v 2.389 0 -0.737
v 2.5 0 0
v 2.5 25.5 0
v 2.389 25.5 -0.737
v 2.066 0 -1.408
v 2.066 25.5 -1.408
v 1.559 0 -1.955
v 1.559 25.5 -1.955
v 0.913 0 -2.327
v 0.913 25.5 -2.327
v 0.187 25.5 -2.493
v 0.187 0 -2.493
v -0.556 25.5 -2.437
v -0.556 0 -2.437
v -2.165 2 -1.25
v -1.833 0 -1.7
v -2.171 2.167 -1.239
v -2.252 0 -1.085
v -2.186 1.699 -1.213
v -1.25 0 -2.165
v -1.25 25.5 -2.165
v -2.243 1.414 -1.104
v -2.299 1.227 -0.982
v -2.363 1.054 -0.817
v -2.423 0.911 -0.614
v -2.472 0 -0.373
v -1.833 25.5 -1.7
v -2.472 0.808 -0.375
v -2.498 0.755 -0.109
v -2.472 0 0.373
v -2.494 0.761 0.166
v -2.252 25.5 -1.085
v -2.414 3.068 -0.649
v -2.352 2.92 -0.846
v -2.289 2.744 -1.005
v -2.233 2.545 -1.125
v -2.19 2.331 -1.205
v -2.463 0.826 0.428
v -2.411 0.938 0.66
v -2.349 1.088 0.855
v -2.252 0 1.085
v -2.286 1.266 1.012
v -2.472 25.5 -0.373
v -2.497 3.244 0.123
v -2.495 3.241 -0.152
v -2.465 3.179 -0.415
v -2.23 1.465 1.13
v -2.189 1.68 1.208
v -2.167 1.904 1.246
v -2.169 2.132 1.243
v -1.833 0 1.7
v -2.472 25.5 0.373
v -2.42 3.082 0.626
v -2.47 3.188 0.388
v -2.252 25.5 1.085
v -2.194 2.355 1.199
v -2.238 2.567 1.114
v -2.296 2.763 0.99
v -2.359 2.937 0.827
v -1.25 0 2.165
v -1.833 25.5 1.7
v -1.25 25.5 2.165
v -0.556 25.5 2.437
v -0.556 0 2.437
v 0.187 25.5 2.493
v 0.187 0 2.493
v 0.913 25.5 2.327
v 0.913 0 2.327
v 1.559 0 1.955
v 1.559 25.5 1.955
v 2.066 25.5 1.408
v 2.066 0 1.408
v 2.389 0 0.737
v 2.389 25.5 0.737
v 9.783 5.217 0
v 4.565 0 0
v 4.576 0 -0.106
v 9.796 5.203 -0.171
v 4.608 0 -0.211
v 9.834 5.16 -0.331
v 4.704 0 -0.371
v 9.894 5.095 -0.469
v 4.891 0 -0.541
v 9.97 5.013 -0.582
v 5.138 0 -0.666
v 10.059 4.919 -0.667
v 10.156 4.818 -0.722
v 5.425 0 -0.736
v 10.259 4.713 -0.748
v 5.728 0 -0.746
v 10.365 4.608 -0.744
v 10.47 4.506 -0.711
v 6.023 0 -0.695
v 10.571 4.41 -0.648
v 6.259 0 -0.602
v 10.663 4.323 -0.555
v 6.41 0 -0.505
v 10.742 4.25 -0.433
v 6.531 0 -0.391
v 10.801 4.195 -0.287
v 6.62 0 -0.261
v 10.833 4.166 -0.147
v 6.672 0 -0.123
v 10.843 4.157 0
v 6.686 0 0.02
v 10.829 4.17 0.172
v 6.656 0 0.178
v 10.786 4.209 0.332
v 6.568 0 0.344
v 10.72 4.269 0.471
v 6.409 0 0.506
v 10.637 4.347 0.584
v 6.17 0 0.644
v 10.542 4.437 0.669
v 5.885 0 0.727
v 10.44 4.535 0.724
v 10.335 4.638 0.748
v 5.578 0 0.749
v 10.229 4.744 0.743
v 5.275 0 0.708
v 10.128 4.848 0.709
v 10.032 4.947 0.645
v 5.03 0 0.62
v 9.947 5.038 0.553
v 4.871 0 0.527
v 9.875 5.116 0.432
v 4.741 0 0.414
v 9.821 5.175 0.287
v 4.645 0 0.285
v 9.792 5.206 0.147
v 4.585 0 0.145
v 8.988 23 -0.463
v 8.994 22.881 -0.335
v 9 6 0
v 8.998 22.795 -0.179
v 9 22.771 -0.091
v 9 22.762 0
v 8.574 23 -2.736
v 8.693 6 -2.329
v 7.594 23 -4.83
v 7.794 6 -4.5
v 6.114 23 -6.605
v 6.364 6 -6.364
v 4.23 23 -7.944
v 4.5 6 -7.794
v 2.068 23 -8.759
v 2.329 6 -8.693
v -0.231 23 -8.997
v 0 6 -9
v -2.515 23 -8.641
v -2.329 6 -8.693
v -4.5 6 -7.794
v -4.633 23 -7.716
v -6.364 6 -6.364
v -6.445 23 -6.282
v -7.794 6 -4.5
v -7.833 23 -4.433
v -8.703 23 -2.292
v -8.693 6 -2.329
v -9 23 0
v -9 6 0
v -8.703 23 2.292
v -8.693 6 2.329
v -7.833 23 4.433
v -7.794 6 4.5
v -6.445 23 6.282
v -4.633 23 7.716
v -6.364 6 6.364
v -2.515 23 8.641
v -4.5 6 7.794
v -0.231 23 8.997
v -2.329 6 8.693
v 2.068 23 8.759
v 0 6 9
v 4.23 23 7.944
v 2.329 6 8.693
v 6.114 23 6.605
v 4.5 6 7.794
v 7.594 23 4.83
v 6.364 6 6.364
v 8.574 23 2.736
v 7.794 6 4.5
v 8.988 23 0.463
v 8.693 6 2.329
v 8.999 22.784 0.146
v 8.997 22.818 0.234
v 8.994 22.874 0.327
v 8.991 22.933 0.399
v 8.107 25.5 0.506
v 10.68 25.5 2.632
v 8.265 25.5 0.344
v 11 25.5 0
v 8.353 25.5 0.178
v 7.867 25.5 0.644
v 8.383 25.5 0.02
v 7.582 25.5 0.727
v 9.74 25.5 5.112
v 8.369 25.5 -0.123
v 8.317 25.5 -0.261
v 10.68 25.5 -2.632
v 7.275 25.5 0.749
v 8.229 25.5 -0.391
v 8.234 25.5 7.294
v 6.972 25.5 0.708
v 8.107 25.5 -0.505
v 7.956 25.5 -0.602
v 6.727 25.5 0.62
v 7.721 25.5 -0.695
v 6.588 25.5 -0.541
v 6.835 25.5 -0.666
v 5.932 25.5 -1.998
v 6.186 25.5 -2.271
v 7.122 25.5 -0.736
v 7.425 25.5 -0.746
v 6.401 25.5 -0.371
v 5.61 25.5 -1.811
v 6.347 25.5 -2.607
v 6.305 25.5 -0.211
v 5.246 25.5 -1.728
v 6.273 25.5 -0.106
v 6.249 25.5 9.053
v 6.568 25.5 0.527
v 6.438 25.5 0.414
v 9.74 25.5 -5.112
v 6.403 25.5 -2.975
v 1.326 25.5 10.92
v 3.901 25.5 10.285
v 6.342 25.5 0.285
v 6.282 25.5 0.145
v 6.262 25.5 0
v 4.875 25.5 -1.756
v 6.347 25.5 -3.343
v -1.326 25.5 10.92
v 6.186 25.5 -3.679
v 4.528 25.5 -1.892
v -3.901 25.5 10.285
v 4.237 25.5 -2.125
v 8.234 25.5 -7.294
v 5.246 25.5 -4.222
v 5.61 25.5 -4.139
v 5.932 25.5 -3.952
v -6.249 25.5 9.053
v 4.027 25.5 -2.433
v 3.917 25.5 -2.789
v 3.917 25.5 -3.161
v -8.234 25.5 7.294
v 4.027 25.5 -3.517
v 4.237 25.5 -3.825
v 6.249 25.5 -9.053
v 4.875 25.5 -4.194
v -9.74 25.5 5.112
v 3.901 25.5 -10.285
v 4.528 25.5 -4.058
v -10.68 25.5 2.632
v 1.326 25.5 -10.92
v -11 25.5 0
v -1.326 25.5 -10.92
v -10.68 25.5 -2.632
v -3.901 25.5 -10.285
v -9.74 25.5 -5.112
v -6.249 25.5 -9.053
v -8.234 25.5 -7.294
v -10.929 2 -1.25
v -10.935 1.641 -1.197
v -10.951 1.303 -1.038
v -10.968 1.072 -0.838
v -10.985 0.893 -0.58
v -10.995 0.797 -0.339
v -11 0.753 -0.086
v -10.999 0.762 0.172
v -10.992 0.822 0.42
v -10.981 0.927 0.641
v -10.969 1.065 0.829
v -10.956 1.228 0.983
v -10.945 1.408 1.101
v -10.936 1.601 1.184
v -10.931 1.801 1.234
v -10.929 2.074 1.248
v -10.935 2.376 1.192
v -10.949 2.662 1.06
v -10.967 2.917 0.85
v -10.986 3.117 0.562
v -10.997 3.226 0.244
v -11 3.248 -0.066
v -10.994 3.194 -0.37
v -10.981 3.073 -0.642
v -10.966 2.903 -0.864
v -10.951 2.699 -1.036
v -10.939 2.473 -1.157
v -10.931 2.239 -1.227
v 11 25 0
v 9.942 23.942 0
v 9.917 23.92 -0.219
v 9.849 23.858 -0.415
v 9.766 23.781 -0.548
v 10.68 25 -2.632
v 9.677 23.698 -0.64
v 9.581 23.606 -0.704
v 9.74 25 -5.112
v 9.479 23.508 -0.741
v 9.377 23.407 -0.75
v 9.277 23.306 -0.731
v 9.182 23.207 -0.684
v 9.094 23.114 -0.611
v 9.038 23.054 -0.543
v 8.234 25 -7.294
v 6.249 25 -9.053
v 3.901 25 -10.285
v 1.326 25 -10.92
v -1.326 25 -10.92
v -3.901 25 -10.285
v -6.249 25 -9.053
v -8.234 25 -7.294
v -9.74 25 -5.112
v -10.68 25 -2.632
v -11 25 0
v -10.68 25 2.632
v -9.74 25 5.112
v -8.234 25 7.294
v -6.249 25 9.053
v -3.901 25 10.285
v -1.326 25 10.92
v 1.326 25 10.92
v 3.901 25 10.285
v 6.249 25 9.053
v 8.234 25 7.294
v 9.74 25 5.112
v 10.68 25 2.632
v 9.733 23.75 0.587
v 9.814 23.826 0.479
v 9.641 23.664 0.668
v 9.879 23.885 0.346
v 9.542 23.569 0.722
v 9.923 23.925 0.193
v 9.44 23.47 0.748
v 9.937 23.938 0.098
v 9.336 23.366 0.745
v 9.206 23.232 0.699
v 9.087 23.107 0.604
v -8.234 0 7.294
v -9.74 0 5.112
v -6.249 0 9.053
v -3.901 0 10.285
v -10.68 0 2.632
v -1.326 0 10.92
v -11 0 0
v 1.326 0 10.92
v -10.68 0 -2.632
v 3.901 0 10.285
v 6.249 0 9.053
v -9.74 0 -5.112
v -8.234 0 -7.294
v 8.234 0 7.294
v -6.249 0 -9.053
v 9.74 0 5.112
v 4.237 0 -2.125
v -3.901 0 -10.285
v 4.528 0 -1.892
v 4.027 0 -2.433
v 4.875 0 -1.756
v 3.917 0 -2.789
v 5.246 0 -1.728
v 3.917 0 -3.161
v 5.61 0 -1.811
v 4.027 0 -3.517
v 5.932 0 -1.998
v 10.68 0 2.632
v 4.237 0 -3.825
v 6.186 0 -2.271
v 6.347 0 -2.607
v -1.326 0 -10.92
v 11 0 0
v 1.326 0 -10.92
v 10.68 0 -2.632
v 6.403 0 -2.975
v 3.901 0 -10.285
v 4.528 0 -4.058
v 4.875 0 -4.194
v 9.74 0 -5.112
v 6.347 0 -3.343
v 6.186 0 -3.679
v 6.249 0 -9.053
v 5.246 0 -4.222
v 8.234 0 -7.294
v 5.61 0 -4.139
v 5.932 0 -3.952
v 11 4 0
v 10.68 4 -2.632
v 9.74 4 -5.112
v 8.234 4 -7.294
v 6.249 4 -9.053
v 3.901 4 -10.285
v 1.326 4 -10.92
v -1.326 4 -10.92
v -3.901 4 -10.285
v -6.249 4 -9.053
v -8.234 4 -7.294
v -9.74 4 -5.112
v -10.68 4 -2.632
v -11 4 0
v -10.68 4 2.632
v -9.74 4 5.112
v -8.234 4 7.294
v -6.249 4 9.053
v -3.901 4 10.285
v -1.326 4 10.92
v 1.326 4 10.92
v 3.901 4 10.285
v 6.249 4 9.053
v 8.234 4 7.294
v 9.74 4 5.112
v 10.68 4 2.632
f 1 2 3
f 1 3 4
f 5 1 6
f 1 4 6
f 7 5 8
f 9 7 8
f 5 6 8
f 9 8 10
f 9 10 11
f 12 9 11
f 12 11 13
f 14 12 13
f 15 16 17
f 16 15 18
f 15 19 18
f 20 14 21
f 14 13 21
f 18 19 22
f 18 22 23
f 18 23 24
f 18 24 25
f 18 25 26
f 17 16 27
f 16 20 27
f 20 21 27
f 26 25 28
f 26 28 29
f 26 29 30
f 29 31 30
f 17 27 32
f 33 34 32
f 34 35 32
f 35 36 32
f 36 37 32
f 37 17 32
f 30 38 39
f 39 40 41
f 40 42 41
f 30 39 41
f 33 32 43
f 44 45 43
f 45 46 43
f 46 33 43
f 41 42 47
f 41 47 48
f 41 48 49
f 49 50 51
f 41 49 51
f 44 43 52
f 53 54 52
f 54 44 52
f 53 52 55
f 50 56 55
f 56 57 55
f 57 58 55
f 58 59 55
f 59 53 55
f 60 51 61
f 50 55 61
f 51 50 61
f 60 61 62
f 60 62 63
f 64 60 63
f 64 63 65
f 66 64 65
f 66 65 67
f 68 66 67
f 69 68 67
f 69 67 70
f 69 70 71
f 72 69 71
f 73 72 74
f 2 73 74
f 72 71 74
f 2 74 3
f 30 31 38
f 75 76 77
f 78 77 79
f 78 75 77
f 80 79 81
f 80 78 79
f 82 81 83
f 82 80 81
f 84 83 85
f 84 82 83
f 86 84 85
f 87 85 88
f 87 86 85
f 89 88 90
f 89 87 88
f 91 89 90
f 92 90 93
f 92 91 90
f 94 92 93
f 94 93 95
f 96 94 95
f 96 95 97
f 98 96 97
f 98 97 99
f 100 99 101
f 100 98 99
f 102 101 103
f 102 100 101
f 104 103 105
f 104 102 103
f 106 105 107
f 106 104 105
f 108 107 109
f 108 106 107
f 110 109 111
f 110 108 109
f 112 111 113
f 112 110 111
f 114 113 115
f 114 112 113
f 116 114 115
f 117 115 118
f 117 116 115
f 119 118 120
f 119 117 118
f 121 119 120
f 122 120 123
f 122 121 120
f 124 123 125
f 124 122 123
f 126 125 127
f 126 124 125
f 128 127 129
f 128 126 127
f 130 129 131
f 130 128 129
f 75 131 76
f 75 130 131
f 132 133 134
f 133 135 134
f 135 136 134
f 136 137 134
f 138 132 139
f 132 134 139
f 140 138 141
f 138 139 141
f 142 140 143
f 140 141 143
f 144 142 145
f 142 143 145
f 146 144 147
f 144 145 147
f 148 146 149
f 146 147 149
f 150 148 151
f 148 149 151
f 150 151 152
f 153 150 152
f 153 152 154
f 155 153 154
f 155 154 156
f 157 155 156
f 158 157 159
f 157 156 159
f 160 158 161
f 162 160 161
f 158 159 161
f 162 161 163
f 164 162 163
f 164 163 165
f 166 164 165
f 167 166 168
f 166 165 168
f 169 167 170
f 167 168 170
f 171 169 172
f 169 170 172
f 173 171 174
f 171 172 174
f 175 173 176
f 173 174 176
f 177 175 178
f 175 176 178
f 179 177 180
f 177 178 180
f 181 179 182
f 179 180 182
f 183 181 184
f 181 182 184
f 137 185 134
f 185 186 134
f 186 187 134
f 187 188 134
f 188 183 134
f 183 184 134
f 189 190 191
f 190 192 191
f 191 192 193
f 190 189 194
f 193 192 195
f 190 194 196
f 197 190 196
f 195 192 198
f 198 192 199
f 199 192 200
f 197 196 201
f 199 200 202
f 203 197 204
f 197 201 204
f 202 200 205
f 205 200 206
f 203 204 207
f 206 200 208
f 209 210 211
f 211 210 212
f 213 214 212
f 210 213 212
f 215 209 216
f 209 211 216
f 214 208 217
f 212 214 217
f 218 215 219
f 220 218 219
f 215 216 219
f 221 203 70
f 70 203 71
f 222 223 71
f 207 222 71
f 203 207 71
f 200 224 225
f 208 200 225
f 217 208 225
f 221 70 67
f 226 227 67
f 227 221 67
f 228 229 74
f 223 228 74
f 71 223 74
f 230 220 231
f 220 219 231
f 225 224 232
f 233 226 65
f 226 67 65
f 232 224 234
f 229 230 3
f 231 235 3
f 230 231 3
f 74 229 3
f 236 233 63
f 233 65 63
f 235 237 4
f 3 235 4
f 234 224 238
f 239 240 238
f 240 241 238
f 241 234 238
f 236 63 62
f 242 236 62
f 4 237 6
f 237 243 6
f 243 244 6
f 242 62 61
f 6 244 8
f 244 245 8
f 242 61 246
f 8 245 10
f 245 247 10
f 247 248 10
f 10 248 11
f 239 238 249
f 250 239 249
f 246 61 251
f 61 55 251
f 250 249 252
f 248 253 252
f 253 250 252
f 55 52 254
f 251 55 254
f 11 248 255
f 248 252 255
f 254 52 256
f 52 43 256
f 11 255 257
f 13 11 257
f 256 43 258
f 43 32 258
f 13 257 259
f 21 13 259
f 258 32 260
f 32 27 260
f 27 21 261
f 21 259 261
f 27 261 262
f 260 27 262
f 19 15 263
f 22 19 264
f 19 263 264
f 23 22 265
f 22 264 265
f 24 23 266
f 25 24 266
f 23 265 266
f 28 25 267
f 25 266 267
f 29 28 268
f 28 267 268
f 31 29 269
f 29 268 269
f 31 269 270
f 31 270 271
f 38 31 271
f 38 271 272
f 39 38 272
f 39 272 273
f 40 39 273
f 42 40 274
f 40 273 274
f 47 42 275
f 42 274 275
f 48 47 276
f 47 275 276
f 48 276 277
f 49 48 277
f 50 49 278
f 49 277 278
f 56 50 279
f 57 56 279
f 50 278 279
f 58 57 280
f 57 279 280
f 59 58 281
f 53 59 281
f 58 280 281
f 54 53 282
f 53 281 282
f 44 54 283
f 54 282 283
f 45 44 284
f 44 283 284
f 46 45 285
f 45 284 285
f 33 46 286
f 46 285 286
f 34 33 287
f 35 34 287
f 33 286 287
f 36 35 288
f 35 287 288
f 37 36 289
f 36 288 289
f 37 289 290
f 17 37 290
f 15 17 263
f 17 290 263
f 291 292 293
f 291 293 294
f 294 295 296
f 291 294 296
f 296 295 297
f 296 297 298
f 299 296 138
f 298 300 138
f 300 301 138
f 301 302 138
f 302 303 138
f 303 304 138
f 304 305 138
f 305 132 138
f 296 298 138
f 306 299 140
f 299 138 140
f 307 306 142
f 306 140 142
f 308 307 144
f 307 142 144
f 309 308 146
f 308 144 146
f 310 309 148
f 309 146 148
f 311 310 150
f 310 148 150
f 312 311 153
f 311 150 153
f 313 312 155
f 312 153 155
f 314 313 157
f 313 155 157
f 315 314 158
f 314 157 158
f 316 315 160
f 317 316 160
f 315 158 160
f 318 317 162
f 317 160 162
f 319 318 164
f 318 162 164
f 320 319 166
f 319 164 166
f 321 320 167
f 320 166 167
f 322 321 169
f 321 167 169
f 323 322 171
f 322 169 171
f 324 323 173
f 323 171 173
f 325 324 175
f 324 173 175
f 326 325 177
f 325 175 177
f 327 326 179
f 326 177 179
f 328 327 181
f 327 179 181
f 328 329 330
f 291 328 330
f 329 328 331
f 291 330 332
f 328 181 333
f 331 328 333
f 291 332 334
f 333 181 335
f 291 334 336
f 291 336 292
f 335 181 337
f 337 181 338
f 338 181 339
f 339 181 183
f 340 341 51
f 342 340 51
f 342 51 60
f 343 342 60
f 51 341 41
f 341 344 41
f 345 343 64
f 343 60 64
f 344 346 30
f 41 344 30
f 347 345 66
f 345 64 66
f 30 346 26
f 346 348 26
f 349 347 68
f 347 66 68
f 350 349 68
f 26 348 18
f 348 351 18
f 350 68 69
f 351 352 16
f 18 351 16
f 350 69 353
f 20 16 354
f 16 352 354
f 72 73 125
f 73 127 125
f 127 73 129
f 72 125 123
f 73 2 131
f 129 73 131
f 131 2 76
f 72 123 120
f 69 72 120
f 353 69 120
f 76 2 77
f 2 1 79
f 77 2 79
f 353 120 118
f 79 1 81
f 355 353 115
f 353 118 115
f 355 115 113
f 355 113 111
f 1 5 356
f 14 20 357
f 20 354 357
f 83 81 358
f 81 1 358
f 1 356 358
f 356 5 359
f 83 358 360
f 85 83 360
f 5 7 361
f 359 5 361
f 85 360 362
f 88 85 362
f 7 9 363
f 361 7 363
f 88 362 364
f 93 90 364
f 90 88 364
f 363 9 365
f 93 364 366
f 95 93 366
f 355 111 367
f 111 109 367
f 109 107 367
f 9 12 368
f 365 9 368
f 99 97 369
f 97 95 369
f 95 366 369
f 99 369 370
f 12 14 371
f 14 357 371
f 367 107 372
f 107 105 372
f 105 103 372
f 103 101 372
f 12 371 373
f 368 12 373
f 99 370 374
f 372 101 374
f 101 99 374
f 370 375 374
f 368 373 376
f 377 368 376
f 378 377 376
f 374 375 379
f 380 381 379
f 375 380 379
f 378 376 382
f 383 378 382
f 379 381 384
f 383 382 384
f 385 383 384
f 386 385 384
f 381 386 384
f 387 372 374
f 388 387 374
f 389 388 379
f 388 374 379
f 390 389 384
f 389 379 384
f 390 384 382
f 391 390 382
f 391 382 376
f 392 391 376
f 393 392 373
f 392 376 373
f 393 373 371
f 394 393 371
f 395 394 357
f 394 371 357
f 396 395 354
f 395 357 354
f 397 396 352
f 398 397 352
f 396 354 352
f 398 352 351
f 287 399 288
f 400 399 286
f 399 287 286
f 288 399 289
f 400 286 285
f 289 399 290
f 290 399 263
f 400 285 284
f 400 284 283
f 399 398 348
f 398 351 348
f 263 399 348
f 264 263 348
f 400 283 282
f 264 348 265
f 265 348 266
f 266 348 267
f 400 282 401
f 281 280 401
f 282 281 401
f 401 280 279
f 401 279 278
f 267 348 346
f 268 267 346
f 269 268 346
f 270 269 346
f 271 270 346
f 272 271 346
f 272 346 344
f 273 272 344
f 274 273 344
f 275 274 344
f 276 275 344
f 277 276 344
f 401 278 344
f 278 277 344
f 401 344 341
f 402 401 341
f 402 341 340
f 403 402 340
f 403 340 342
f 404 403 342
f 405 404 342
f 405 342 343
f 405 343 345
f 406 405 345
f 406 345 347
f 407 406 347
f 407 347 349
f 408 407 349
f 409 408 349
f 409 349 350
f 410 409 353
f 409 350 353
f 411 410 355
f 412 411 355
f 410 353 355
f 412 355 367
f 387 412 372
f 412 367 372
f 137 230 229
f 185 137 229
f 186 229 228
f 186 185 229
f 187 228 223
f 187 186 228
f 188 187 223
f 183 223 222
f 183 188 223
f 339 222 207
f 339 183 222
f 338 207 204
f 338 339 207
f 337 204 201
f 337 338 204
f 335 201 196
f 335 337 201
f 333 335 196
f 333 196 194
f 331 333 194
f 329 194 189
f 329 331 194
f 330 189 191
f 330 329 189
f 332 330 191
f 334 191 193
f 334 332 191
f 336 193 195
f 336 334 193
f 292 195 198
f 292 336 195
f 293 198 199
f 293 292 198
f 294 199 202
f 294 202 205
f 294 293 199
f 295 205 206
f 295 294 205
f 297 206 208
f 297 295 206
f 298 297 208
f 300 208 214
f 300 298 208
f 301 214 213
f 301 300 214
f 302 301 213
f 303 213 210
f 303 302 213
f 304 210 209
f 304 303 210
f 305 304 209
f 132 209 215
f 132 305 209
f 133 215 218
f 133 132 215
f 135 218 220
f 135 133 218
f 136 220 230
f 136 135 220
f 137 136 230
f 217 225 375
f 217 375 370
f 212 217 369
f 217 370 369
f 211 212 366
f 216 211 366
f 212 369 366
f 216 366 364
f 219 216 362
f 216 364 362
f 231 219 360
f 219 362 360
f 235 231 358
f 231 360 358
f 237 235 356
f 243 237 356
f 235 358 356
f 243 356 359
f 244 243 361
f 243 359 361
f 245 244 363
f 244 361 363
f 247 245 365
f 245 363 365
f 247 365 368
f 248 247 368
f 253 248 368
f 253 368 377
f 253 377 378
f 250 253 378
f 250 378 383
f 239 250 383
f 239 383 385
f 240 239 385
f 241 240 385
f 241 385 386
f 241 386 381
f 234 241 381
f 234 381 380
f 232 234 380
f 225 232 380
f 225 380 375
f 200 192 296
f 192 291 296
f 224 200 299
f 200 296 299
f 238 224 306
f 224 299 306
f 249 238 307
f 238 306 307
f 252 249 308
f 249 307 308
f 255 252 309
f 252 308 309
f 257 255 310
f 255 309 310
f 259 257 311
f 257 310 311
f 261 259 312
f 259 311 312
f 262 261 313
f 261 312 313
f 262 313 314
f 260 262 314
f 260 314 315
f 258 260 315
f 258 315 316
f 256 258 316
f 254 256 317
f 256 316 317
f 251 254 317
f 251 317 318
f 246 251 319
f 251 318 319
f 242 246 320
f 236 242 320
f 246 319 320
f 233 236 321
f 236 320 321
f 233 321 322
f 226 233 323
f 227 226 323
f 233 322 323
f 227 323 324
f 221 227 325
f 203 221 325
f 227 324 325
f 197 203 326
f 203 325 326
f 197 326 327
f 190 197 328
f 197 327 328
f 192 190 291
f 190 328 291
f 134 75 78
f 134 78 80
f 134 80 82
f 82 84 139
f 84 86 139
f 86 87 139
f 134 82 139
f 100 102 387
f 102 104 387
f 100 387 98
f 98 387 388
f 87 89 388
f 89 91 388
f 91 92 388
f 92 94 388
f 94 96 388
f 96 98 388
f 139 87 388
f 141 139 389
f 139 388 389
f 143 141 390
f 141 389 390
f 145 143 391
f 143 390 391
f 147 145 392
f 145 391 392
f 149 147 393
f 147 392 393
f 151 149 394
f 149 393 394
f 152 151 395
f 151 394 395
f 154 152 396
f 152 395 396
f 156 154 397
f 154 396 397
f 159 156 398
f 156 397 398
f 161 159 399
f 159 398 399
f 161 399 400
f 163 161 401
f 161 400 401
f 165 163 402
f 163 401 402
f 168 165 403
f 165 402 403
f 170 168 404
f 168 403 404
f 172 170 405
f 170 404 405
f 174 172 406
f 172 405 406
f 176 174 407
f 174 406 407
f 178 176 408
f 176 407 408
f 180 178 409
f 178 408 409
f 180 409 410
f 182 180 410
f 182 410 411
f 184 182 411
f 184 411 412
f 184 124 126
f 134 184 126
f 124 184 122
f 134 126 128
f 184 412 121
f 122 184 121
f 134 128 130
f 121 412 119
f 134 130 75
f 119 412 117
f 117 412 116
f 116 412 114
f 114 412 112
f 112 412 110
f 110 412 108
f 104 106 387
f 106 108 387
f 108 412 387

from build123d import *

# Parameters (mm, degrees)
SKETCH9_R          = 1.25
CUT_EXTRUDE2_DEPTH = 26.5
SKETCH13_W         = 1.25
SKETCH13_H         = 11


with BuildPart() as part:
    # Sketch11 → Revolve1 (revolve)
    with BuildSketch(Plane.XY):
        Polygon((2.5, 25.5), (11, 25.5), (11, 25), (9, 23), (9, 6), (11, 4), (11, 0), (2.5, 0), align=None)
    revolve(axis=Axis((0, 0, 0), (0, 1, 0)))

    # Sketch9 → Cut-Extrude2 (cut, through all)
    with BuildSketch(Plane.XZ):
        with Locations((5.152851153, -2.975)):
            Circle(SKETCH9_R)
    extrude(amount=-CUT_EXTRUDE2_DEPTH, mode=Mode.SUBTRACT)

    # Sketch10 → Cut-Revolve1 (revolve, cut)
    with BuildSketch(Plane.XY):
        Polygon((5.095658377, -0.530330086), (4.565328291, 0), (9.782664146, 5.217335854), (10.312994231, 4.687005769), align=None)
    revolve(axis=Axis((10.312994231, 4.687005769, 0), (-0.707106781, -0.707106781, 0)), mode=Mode.SUBTRACT)

    # Sketch10_3 → Cut-Revolve2 (revolve, cut)
    with BuildSketch(Plane.XY):
        Polygon((10.41573594, 22.407308798), (6.792714652, 26.030330086), (6.262384566, 25.5), (9.885405854, 21.876978712), align=None)
    revolve(axis=Axis((10.41573594, 22.407308798, 0), (-0.707106781, 0.707106781, 0)), mode=Mode.SUBTRACT)

    # Sketch13 → M3x0.5 Tapped Hole1 (revolve, cut)
    with BuildSketch(Plane(origin=(0, 2, 0), x_dir=(0, 0, -1), z_dir=(0, 1, 0))):
        with Locations((0.625, 5.5)):
            Rectangle(SKETCH13_W, SKETCH13_H)
    revolve(axis=Axis((6.35, 2, 0), (-1, 0, 0)), mode=Mode.SUBTRACT)


solid = part.part
